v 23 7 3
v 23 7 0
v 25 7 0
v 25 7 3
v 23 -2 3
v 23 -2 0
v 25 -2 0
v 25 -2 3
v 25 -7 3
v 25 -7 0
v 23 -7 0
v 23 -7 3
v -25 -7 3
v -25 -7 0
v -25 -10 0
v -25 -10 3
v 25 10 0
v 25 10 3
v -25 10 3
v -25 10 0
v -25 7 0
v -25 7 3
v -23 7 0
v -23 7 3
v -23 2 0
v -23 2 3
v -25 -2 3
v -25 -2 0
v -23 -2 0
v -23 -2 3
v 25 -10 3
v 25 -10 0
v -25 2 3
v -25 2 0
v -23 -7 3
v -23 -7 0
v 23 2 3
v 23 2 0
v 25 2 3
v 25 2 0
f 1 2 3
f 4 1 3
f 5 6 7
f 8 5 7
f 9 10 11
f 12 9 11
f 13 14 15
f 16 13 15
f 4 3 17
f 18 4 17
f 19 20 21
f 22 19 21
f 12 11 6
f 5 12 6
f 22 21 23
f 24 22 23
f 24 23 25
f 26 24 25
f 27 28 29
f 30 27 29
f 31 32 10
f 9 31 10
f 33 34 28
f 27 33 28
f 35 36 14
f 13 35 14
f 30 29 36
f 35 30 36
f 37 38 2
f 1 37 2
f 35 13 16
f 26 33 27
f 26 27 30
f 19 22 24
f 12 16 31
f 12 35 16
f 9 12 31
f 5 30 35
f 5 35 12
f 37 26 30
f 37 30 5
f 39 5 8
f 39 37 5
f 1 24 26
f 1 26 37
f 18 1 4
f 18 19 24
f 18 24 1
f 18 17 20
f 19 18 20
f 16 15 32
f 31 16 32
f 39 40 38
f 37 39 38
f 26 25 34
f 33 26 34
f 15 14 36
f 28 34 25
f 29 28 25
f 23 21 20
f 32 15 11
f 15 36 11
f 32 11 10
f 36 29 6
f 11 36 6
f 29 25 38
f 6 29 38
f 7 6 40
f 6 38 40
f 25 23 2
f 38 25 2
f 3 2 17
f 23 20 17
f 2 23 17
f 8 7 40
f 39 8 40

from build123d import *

# Parameters (mm, degrees)
F1_DEPTH = 3


with BuildPart() as f1:
    # F0 (on Top) → F1 (new body)
    with BuildSketch(Plane.XY):
        Polygon((25, 10), (-25, 10), (-25, 7), (-23, 7), (-23, 2), (-25, 2), (-25, 0), (-25, -2), (-23, -2), (-23, -7), (-25, -7), (-25, -10), (25, -10), (25, -7), (23, -7), (23, -2), (25, -2), (25, 0), (25, 2), (23, 2), (23, 7), (25, 7), align=None)
    extrude(amount=F1_DEPTH)


solid = f1.part
